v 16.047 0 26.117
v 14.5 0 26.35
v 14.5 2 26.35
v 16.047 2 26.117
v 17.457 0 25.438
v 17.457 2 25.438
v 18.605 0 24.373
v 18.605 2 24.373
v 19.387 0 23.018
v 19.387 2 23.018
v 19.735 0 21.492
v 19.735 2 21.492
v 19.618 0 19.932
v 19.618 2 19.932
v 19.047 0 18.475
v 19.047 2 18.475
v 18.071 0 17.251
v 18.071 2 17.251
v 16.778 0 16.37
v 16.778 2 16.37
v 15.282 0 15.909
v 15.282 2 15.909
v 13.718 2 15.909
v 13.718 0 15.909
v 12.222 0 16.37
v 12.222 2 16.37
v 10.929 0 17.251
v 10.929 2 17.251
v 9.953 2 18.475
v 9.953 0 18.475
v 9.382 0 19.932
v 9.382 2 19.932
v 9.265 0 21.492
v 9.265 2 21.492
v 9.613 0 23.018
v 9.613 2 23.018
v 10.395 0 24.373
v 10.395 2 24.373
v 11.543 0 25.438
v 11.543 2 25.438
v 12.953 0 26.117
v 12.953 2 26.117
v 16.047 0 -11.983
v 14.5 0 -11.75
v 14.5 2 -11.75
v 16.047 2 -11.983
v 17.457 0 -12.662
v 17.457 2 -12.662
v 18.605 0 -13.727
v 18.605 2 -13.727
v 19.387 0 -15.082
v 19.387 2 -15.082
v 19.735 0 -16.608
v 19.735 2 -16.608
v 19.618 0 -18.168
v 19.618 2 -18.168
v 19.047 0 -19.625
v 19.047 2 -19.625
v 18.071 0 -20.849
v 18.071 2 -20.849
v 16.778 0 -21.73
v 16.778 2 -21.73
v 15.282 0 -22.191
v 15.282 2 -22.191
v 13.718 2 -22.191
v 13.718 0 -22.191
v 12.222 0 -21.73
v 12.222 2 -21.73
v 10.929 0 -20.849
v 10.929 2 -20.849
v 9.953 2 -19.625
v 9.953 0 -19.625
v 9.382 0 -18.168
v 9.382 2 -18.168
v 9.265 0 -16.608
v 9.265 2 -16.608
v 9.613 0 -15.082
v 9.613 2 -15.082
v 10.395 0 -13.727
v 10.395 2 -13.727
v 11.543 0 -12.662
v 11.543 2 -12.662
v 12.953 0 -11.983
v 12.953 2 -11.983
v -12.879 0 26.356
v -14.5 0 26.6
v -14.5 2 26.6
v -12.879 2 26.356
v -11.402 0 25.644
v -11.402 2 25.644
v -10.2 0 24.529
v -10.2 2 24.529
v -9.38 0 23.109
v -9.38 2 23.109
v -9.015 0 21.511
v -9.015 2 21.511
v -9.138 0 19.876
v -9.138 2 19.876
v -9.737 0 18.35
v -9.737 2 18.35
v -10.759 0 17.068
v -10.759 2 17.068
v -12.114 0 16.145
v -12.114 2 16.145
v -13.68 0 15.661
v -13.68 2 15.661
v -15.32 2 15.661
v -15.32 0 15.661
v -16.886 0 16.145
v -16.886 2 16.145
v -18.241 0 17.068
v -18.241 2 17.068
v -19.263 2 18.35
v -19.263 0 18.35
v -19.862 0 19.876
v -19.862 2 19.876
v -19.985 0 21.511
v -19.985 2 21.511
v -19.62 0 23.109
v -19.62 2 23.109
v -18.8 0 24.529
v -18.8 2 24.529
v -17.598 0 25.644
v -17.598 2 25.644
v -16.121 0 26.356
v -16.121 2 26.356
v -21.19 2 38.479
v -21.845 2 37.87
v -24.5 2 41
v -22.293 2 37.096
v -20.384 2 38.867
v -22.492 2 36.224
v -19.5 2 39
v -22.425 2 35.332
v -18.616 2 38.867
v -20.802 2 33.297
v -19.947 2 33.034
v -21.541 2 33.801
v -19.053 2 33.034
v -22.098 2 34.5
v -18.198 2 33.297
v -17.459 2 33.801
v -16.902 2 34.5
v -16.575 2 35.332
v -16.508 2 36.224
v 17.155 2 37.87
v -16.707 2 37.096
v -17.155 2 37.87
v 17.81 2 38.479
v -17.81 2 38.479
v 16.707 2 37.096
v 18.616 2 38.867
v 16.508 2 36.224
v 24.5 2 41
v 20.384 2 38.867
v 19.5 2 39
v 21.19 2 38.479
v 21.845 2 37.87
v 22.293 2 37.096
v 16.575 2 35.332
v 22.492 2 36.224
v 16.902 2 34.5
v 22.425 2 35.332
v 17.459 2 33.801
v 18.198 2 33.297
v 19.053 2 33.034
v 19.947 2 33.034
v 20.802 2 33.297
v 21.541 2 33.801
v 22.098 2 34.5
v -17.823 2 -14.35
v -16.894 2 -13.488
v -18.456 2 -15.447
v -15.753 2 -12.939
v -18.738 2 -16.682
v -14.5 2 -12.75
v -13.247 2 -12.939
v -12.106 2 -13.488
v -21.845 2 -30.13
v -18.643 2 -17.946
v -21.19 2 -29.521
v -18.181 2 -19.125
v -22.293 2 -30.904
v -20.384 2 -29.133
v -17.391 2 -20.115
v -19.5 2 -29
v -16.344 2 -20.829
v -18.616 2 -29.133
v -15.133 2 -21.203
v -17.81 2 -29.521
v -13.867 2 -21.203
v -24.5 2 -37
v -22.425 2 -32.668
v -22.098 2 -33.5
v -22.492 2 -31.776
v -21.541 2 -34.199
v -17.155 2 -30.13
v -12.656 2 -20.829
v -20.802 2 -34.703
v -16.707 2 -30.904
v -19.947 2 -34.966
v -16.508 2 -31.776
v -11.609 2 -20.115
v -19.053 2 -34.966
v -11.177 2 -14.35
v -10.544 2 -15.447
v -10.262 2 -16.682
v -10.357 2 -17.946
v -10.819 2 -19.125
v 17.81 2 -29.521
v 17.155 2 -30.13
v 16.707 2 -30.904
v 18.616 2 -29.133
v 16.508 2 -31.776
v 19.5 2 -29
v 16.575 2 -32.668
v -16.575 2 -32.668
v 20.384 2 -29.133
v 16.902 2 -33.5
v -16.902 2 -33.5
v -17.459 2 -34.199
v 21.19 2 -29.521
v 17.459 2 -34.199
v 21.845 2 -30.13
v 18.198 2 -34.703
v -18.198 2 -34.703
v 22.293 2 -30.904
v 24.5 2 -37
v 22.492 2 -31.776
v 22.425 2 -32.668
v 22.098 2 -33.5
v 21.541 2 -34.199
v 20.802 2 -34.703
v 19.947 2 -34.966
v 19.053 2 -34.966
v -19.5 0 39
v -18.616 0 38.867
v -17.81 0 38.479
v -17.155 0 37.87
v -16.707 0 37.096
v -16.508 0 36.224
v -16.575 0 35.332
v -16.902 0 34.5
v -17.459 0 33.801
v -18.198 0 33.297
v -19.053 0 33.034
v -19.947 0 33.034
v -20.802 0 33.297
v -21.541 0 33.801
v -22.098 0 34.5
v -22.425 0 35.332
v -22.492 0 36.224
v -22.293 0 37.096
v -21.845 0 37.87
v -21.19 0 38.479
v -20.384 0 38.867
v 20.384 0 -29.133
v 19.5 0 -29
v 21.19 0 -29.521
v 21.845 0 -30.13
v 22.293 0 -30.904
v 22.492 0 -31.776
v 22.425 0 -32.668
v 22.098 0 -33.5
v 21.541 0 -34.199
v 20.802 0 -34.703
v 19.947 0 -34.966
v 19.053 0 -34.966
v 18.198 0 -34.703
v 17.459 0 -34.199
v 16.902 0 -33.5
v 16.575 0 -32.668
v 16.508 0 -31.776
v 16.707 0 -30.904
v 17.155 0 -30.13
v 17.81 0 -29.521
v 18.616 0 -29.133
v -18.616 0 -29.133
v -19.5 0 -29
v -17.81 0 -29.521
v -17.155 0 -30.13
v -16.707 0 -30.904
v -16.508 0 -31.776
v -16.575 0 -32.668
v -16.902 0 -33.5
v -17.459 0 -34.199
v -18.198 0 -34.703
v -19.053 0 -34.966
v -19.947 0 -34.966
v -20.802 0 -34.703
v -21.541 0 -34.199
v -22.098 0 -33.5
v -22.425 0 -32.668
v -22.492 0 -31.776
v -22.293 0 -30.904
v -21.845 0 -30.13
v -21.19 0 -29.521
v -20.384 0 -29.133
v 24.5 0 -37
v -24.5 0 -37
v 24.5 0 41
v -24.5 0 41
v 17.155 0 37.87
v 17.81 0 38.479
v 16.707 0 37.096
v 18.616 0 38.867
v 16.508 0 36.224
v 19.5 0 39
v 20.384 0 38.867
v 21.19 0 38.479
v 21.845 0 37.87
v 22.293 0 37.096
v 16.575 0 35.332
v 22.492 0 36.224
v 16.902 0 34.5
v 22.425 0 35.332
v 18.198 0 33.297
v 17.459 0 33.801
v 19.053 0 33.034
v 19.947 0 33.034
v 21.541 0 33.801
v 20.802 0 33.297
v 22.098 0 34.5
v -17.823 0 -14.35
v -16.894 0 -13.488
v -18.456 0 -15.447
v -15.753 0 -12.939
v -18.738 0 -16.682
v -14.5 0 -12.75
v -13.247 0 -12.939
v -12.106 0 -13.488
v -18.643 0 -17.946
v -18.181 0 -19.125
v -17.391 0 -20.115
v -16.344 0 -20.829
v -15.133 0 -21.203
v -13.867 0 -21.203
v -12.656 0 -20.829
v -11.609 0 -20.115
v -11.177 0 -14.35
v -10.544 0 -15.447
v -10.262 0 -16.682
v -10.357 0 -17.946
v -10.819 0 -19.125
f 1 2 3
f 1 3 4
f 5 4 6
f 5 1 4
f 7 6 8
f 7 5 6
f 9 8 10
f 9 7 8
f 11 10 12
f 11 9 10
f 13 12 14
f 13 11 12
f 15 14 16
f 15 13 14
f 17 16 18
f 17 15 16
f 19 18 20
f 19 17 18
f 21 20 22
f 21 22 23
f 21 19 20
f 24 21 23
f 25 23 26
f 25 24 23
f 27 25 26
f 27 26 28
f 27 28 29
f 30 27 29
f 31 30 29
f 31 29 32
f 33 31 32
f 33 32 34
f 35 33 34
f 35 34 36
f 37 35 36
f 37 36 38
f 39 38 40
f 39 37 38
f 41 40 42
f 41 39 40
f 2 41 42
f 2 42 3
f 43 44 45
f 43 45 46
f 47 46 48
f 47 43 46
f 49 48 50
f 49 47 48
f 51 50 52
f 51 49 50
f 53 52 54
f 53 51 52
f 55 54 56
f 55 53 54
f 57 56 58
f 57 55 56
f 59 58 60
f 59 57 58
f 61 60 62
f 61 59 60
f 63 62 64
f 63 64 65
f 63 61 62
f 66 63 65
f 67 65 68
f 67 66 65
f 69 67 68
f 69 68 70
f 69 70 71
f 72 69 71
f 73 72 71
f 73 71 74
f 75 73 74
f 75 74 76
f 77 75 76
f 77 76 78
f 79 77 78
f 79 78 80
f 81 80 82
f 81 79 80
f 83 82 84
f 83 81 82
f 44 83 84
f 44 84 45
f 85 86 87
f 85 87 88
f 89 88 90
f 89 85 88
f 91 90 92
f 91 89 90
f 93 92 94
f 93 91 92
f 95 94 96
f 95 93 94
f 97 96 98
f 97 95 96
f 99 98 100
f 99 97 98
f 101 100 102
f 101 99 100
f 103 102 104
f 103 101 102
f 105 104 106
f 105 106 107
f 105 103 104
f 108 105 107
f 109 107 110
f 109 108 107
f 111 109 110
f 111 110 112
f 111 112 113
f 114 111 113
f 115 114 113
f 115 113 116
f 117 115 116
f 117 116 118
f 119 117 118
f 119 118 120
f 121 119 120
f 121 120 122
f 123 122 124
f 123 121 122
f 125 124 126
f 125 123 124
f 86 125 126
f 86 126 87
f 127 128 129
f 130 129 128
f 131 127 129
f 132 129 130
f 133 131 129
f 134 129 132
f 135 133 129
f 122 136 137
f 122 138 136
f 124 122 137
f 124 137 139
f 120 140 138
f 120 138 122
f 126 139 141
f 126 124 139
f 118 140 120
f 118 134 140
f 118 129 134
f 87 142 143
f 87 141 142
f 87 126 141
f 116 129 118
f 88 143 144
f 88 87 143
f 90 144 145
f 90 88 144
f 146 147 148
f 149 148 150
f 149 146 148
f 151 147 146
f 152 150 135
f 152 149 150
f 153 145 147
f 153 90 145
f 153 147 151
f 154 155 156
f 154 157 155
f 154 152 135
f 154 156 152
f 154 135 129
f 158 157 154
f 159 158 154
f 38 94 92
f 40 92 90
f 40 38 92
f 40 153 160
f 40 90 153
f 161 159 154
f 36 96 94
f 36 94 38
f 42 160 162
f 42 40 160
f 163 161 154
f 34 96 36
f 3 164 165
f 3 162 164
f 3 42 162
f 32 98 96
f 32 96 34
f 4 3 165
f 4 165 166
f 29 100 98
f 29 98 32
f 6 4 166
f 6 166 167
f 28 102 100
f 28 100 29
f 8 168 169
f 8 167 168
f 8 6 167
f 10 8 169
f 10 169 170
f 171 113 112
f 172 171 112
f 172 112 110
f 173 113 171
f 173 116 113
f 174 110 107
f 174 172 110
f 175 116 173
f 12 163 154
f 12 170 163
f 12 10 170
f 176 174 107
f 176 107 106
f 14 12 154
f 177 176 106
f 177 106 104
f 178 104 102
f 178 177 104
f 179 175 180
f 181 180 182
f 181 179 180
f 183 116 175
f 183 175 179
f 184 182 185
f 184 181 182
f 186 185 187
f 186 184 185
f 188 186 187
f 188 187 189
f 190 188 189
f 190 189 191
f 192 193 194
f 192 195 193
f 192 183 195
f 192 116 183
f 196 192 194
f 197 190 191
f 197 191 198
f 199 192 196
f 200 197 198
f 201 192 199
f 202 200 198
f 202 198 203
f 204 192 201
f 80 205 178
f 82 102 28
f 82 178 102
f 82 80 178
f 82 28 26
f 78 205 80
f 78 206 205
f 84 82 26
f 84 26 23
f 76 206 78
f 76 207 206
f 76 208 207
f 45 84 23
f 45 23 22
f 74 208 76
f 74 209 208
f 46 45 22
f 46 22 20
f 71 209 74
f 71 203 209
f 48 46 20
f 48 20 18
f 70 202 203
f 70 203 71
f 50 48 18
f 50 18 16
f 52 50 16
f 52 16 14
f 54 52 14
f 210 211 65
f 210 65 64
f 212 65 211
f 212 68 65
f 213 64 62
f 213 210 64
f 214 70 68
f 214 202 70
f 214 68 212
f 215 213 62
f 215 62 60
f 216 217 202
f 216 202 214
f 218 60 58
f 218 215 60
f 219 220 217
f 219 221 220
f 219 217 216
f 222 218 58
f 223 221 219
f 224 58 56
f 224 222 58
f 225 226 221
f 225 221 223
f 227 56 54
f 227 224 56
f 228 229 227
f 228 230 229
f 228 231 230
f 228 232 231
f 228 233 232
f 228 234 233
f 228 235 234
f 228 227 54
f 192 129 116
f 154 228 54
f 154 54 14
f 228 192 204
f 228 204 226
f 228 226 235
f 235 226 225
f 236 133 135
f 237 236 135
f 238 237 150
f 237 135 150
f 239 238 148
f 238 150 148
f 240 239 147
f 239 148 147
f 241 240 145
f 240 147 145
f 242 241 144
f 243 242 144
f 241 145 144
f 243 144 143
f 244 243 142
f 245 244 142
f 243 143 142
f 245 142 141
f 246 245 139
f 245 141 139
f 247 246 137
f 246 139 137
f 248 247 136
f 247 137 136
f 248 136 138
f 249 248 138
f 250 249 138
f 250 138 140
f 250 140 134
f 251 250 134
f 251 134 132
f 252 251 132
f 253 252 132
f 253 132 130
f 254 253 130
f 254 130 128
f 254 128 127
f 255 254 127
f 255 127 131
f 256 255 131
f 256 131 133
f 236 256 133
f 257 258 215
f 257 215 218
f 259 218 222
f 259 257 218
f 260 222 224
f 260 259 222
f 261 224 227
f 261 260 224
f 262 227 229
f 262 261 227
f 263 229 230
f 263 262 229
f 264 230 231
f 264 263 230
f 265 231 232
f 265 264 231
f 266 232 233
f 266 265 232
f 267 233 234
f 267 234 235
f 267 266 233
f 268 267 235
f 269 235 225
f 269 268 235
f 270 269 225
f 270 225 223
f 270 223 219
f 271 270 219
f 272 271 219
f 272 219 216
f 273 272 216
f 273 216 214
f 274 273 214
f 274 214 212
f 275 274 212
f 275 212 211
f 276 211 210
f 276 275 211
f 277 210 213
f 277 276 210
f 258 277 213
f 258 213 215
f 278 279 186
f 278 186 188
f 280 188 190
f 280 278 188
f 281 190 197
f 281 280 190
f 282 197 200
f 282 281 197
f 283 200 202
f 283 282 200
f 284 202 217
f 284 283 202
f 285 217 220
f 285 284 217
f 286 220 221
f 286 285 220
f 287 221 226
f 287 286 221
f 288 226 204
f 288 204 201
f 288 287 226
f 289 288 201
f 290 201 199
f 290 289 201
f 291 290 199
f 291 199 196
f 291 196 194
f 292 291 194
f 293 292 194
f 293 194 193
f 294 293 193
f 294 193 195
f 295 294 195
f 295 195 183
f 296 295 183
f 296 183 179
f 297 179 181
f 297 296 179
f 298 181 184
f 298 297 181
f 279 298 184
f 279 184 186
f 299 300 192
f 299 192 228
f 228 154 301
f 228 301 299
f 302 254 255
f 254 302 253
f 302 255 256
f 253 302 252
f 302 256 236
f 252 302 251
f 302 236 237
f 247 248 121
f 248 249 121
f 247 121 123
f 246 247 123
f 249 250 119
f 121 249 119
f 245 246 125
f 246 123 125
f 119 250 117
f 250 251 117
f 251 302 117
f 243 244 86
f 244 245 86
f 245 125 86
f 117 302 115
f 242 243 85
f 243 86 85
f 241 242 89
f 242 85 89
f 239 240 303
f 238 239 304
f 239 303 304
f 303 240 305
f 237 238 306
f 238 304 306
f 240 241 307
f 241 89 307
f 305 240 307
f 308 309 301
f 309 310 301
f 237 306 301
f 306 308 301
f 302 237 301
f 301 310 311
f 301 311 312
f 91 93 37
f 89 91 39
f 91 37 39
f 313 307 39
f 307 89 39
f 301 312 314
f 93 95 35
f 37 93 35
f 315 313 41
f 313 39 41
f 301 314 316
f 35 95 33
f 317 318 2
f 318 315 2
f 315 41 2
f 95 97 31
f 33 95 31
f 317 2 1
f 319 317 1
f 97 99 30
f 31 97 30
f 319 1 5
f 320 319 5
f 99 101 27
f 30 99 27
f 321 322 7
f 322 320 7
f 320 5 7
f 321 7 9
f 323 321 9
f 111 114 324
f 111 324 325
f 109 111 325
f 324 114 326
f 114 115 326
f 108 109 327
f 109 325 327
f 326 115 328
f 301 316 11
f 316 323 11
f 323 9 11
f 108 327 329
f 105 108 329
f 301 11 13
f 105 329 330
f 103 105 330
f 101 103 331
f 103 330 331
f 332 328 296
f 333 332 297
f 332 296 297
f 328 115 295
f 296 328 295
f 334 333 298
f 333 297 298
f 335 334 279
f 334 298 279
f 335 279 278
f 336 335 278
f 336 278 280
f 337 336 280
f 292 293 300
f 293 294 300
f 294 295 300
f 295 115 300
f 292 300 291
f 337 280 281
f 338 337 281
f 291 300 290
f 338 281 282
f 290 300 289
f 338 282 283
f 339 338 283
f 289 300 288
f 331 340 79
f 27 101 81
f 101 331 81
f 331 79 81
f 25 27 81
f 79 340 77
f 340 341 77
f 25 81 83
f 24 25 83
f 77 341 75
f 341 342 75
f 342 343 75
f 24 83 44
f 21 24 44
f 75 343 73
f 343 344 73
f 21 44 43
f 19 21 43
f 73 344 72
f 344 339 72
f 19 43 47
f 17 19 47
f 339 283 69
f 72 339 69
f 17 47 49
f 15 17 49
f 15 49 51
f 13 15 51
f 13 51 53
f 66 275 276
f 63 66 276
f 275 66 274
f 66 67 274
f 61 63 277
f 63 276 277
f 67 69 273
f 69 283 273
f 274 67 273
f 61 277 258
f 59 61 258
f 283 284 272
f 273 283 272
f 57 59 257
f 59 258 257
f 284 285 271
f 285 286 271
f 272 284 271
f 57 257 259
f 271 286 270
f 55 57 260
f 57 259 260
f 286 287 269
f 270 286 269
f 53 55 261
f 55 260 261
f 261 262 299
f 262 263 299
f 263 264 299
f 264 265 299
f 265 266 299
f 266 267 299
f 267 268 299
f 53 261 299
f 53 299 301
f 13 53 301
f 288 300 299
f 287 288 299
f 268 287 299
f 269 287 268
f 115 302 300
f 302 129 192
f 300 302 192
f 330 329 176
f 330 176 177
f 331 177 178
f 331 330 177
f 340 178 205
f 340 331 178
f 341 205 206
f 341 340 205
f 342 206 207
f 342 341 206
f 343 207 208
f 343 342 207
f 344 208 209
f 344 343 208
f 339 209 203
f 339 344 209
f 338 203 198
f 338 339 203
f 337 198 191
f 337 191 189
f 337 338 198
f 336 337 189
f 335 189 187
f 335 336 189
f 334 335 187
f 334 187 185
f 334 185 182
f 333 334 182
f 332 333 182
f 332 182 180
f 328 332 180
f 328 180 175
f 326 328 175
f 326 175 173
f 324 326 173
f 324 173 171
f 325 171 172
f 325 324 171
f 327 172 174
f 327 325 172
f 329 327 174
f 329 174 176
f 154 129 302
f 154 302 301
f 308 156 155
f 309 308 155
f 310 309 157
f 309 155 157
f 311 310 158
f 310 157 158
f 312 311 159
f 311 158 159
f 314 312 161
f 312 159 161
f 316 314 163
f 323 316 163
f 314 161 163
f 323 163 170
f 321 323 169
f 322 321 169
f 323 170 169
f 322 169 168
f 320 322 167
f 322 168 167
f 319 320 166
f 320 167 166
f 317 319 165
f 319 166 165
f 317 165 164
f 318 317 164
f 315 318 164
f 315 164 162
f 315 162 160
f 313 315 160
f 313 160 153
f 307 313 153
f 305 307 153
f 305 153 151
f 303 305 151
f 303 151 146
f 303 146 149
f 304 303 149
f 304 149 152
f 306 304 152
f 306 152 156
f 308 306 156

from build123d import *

# Parameters (mm, degrees)
CROQUIS1_W              = 49
CROQUIS1_H              = 73
CROQUIS1_R              = 5.25
CROQUIS1_R_2            = 5.5
CROQUIS1_R_3            = 4.25
CROQUIS1_R_4            = 3
SALIENTE_EXTRUIR4_DEPTH = 2
CROQUIS7_W              = 49
CROQUIS7_H              = 5
SALIENTE_EXTRUIR5_DEPTH = 2
CROQUIS8_R              = 3
CORTAR_EXTRUIR2_DEPTH   = 10


with BuildPart() as part:
    # Croquis1 → Saliente-Extruir4 (new body)
    with BuildSketch(Plane(origin=(0, 0, 0), x_dir=(1, 0, 0), z_dir=(0, 1, 0))):
        with Locations((0, 0.5)):
            Rectangle(CROQUIS1_W, CROQUIS1_H)
        with Locations(Location((14.5, -21.1, 0), (0, 0, 270))):
            Circle(CROQUIS1_R, mode=Mode.SUBTRACT)
        with Locations(Location((-14.5, -21.1, 0), (0, 0, 270))):
            Circle(CROQUIS1_R_2, mode=Mode.SUBTRACT)
        with Locations(Location((-14.5, 17, 0), (0, 0, 270))):
            Circle(CROQUIS1_R_3, mode=Mode.SUBTRACT)
        with Locations(Location((14.5, 17, 0), (0, 0, 270))):
            Circle(CROQUIS1_R, mode=Mode.SUBTRACT)
        with Locations(Location((-19.5, 32, 0), (0, 0, 270))):
            Circle(CROQUIS1_R_4, mode=Mode.SUBTRACT)
        with Locations(Location((19.5, 32, 0), (0, 0, 270))):
            Circle(CROQUIS1_R_4, mode=Mode.SUBTRACT)
    extrude(amount=SALIENTE_EXTRUIR4_DEPTH)

    # Croquis7 → Saliente-Extruir5 (add)
    with BuildSketch(Plane(origin=(0, 2, 0), x_dir=(1, 0, 0), z_dir=(0, 1, 0))):
        with Locations((0, -38.5)):
            Rectangle(CROQUIS7_W, CROQUIS7_H)
    extrude(amount=-SALIENTE_EXTRUIR5_DEPTH)

    # Croquis8 → Cortar-Extruir2 (cut)
    with BuildSketch(Plane(origin=(0, 2, 0), x_dir=(1, 0, 0), z_dir=(0, 1, 0))):
        with Locations(Location((-19.5, -36, 0), (0, 0, 270))):
            Circle(CROQUIS8_R)
        with Locations(Location((19.5, -36, 0), (0, 0, 270))):
            Circle(CROQUIS8_R)
    extrude(amount=-CORTAR_EXTRUIR2_DEPTH, mode=Mode.SUBTRACT)


solid = part.part
